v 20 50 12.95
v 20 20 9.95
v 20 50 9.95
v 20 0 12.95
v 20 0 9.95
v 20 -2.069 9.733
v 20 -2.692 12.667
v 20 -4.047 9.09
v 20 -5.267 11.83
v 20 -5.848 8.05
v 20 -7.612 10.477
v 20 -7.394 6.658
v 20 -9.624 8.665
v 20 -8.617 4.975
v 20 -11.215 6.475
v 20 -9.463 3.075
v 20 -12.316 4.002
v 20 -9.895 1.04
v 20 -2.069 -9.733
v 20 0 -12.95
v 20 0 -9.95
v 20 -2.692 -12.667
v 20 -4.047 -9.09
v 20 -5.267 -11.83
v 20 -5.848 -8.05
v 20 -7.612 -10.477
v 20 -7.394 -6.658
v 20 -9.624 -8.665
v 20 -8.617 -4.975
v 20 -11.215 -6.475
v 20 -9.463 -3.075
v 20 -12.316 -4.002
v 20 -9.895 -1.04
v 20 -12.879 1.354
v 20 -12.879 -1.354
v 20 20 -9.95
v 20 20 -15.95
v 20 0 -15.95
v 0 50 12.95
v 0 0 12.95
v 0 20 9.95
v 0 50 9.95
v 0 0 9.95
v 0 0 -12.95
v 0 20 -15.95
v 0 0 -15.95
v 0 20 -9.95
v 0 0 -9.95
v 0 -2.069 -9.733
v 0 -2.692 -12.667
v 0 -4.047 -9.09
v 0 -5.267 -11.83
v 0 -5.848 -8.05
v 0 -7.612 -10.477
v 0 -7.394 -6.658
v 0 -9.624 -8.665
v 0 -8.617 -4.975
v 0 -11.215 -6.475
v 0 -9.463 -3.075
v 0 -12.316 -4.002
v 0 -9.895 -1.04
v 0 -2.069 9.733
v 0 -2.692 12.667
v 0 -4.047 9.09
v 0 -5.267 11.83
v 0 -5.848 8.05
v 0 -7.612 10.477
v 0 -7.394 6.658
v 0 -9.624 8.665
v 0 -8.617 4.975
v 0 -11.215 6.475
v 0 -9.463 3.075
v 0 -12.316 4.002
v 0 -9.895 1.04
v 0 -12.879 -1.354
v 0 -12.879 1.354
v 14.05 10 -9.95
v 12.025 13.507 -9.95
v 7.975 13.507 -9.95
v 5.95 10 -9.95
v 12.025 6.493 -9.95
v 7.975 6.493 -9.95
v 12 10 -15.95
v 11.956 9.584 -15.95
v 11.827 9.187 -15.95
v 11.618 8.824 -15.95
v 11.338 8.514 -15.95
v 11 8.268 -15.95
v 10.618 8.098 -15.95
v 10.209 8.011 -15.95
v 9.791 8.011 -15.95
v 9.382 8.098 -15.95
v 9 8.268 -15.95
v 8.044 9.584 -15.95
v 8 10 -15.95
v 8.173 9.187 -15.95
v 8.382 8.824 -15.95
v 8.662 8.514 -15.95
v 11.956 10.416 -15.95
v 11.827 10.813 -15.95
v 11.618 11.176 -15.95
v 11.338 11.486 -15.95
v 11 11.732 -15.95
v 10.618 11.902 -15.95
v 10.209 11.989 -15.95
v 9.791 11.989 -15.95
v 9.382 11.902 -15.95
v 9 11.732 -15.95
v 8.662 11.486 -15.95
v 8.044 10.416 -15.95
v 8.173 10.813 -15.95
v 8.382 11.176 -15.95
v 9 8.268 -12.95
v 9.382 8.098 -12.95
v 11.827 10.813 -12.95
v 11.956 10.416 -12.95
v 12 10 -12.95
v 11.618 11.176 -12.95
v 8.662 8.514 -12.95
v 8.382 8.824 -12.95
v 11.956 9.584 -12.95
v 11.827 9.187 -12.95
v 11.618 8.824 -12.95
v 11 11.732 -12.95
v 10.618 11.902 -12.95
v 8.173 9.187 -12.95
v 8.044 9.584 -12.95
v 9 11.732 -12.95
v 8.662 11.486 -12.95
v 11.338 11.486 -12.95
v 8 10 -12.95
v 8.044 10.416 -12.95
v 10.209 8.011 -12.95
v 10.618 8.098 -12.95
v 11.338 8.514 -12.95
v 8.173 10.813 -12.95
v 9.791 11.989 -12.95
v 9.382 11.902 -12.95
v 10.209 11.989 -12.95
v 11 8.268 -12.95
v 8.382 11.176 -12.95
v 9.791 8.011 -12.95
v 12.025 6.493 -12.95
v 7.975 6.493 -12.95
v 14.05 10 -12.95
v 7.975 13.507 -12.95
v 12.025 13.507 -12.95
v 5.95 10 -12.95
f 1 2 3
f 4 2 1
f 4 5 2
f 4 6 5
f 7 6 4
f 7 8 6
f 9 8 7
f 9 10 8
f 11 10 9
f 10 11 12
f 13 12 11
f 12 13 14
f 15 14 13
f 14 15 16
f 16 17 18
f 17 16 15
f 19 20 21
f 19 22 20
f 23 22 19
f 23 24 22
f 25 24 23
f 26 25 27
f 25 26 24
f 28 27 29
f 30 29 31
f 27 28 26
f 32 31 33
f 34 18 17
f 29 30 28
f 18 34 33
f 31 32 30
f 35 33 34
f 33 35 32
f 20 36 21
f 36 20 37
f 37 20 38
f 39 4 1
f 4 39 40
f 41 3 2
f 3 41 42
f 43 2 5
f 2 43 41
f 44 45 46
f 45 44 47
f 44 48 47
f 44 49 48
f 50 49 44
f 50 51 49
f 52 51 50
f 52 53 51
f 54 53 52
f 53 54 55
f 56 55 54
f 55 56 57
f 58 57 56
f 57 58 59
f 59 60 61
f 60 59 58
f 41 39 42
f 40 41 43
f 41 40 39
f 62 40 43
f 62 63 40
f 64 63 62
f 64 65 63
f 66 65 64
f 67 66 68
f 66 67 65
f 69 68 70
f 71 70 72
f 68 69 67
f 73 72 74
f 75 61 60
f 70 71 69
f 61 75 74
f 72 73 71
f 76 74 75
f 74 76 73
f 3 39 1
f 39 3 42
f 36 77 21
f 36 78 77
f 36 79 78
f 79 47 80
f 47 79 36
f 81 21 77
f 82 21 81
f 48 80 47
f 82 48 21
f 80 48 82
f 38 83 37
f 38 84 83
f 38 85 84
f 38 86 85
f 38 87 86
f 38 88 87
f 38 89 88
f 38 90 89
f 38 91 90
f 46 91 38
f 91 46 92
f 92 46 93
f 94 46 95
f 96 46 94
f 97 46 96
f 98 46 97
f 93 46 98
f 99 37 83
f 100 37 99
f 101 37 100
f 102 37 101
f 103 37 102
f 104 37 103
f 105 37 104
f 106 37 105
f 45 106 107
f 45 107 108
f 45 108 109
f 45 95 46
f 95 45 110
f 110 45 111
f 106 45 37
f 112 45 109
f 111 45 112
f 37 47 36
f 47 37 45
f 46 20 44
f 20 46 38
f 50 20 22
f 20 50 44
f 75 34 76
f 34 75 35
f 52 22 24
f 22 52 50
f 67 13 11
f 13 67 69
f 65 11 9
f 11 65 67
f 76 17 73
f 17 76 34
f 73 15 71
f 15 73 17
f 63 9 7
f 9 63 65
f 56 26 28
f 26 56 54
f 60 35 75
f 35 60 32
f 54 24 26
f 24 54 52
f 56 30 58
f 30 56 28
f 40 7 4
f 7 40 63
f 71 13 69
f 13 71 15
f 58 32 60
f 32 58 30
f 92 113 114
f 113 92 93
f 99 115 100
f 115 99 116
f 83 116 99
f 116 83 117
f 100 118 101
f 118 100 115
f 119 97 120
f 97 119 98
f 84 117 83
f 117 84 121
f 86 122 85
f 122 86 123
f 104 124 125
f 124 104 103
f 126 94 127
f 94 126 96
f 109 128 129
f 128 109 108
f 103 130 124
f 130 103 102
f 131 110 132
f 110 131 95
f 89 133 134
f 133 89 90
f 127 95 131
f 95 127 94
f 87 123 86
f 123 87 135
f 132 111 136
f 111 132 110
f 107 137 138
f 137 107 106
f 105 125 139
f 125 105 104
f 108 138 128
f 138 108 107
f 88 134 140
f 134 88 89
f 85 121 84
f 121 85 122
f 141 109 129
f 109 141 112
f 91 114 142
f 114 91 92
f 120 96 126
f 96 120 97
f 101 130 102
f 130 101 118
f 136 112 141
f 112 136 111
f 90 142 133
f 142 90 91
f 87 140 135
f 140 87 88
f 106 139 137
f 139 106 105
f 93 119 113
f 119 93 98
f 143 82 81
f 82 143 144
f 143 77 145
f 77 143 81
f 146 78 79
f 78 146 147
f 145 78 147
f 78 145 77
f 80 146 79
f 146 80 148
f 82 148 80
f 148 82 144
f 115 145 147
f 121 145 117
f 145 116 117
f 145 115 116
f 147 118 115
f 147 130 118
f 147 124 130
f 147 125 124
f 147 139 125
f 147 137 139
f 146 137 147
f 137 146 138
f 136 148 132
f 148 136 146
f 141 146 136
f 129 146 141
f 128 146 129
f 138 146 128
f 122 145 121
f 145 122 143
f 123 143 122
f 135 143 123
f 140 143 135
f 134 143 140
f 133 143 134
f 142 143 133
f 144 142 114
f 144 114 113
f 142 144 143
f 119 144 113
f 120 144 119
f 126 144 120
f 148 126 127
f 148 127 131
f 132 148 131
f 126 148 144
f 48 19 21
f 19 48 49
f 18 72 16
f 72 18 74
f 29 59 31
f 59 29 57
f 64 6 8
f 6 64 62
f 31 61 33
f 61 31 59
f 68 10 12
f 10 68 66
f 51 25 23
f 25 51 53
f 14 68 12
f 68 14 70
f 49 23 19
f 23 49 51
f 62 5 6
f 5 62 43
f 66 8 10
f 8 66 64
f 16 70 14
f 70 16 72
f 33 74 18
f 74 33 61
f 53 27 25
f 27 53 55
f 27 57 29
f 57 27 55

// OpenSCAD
$fn = 30;

use <MCAD/nuts_and_bolts.scad>

wall = 3;
internal_sz_z = 19.9;
sz_x = 20;
top_sz_y = 50;
bottom_sz_y = 20;
down_sz_z = 20;
bolt_hole_off = 10;
bolt_body_d = 4;
bolt_head_d = 6;
bolt_body_sz_z = 1.5;

  difference() {
    union() {
      translate([0, 0, internal_sz_z/2]) {
        cube([sz_x, top_sz_y,wall]);
      }
      translate([0, 0, -internal_sz_z/2-wall*2]) {
        cube([sz_x, bottom_sz_y, wall*2]);
      }
      rotate([0, 90, 0]) {
        cylinder(d=internal_sz_z+wall*2, h=sz_x);
      }
//      translate([0, bottom_sz_y, -internal_sz_z/2-down_sz_z]) {
//        cube([sz_x, wall, down_sz_z]);
//      }
//    translate([sz_x/2, bolt_hole_off, -internal_sz_z/2-wall-bolt_body_sz_z]) {
//      cylinder(d=bolt_body_d, h=bolt_body_sz_z);
//    }
    }
    rotate([0, 90, 0]) {
      cylinder(d=internal_sz_z, h=sz_x);
    }
    translate([0, 0, -internal_sz_z/2]) {
      cube([sz_x, bottom_sz_y, internal_sz_z]);
    }
    translate([sz_x/2, bolt_hole_off, -internal_sz_z/2-wall*2]) {
      cylinder(d=bolt_body_d, h=bolt_body_sz_z+wall*2);
      translate([0, 0, wall]) {
        nutHole(4);
      }
    }
  }
